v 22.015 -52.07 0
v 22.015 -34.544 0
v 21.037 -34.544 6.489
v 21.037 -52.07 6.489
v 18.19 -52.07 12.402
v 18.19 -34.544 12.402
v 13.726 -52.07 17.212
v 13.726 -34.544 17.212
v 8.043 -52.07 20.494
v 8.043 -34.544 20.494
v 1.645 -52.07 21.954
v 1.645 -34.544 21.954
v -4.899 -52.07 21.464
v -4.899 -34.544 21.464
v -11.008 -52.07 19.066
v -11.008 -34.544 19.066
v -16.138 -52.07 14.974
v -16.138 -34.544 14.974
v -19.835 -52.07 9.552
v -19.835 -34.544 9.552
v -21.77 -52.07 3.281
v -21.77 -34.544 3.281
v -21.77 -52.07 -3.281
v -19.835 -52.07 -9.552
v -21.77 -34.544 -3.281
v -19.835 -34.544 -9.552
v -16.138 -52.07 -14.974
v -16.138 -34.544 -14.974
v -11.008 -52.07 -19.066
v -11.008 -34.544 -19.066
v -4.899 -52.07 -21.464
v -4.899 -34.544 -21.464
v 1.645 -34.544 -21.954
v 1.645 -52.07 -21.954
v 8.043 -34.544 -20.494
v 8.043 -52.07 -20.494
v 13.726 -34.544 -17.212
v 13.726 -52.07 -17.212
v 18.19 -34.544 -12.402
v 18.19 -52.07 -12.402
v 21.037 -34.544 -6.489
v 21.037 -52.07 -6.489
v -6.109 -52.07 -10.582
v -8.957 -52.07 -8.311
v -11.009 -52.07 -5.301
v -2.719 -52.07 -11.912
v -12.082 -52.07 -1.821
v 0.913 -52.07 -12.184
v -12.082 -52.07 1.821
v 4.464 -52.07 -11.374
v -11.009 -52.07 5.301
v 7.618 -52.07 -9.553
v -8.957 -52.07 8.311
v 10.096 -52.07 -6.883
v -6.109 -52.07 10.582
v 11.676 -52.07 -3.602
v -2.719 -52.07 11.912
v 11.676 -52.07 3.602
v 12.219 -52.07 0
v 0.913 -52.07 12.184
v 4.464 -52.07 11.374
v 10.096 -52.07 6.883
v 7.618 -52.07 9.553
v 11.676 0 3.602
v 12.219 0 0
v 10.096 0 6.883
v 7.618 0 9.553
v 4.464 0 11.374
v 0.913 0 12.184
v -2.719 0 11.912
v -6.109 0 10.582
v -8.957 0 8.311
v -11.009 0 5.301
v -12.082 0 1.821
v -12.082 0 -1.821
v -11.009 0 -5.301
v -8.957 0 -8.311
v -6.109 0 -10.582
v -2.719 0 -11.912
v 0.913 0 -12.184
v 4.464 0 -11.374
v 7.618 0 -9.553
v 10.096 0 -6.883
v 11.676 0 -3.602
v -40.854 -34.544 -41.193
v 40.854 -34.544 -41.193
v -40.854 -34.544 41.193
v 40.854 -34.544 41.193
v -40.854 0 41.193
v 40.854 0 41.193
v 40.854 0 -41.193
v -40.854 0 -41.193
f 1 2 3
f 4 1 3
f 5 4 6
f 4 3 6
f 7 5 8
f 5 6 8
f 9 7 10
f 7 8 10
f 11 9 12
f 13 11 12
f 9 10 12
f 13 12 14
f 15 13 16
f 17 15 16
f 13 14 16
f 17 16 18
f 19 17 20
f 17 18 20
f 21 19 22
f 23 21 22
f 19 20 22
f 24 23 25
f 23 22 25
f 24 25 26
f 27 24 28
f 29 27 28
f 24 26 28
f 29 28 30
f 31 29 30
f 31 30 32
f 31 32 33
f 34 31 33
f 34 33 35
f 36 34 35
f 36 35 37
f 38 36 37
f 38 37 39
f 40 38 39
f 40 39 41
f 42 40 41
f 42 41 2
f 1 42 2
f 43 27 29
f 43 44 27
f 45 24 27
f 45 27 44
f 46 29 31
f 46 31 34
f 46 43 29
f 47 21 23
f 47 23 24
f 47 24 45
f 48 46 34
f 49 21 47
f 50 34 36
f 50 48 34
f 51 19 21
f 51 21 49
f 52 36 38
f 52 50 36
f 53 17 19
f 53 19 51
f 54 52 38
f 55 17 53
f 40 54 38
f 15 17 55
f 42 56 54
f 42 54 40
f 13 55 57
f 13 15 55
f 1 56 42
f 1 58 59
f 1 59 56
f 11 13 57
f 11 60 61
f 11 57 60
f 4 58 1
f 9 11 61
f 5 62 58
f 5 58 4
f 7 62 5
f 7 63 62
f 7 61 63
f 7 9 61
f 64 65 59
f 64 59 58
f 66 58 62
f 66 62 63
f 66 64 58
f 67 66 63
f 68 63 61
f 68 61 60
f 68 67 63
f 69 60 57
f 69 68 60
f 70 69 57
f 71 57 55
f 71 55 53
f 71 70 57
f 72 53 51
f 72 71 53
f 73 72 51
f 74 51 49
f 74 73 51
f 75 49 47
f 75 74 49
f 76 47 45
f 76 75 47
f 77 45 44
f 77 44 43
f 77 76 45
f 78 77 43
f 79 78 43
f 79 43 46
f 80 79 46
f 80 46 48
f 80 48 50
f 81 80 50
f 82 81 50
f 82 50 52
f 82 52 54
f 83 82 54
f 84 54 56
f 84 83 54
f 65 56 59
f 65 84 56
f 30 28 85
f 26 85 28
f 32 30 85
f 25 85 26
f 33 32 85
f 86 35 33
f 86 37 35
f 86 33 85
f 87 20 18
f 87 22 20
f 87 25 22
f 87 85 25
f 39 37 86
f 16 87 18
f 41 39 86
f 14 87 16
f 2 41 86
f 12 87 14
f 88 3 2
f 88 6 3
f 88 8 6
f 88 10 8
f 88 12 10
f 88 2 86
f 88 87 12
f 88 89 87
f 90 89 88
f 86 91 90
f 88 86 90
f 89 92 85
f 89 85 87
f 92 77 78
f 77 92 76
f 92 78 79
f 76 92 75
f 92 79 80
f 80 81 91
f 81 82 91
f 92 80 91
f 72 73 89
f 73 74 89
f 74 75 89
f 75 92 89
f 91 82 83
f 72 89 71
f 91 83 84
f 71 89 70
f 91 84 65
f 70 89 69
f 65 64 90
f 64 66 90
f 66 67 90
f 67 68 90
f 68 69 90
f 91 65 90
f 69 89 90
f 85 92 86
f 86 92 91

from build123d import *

# Parameters (mm, degrees)
F0_W     = 81.7074924707
F0_H     = 82.3852196336
F0_R     = 22.0154906443
F1_DEPTH = 34.544
F0_R_2   = 12.2186254277
F2_DEPTH = 52.07
F3_DEPTH = 147


# Not quite as in the source:
# - an extrude ends at something that could not be found from the text; its depth is read off the source's solid


with BuildPart() as f1:
    # F0 (on Front) → F1 (new body)
    with BuildSketch(Plane.XZ):
        Rectangle(F0_W, F0_H)
        Circle(F0_R, mode=Mode.SUBTRACT)
    extrude(amount=F1_DEPTH)

    # F0 (on Front) → F2 (join)
    with BuildSketch(Plane.XZ):
        Circle(F0_R)
        Circle(F0_R_2, mode=Mode.SUBTRACT)
    extrude(amount=F2_DEPTH)

    # F0 (on Front) → F3 (cut, through all)
    with BuildSketch(Plane.XZ):
        Circle(F0_R_2)
    extrude(amount=-F3_DEPTH, mode=Mode.SUBTRACT)


solid = f1.part
